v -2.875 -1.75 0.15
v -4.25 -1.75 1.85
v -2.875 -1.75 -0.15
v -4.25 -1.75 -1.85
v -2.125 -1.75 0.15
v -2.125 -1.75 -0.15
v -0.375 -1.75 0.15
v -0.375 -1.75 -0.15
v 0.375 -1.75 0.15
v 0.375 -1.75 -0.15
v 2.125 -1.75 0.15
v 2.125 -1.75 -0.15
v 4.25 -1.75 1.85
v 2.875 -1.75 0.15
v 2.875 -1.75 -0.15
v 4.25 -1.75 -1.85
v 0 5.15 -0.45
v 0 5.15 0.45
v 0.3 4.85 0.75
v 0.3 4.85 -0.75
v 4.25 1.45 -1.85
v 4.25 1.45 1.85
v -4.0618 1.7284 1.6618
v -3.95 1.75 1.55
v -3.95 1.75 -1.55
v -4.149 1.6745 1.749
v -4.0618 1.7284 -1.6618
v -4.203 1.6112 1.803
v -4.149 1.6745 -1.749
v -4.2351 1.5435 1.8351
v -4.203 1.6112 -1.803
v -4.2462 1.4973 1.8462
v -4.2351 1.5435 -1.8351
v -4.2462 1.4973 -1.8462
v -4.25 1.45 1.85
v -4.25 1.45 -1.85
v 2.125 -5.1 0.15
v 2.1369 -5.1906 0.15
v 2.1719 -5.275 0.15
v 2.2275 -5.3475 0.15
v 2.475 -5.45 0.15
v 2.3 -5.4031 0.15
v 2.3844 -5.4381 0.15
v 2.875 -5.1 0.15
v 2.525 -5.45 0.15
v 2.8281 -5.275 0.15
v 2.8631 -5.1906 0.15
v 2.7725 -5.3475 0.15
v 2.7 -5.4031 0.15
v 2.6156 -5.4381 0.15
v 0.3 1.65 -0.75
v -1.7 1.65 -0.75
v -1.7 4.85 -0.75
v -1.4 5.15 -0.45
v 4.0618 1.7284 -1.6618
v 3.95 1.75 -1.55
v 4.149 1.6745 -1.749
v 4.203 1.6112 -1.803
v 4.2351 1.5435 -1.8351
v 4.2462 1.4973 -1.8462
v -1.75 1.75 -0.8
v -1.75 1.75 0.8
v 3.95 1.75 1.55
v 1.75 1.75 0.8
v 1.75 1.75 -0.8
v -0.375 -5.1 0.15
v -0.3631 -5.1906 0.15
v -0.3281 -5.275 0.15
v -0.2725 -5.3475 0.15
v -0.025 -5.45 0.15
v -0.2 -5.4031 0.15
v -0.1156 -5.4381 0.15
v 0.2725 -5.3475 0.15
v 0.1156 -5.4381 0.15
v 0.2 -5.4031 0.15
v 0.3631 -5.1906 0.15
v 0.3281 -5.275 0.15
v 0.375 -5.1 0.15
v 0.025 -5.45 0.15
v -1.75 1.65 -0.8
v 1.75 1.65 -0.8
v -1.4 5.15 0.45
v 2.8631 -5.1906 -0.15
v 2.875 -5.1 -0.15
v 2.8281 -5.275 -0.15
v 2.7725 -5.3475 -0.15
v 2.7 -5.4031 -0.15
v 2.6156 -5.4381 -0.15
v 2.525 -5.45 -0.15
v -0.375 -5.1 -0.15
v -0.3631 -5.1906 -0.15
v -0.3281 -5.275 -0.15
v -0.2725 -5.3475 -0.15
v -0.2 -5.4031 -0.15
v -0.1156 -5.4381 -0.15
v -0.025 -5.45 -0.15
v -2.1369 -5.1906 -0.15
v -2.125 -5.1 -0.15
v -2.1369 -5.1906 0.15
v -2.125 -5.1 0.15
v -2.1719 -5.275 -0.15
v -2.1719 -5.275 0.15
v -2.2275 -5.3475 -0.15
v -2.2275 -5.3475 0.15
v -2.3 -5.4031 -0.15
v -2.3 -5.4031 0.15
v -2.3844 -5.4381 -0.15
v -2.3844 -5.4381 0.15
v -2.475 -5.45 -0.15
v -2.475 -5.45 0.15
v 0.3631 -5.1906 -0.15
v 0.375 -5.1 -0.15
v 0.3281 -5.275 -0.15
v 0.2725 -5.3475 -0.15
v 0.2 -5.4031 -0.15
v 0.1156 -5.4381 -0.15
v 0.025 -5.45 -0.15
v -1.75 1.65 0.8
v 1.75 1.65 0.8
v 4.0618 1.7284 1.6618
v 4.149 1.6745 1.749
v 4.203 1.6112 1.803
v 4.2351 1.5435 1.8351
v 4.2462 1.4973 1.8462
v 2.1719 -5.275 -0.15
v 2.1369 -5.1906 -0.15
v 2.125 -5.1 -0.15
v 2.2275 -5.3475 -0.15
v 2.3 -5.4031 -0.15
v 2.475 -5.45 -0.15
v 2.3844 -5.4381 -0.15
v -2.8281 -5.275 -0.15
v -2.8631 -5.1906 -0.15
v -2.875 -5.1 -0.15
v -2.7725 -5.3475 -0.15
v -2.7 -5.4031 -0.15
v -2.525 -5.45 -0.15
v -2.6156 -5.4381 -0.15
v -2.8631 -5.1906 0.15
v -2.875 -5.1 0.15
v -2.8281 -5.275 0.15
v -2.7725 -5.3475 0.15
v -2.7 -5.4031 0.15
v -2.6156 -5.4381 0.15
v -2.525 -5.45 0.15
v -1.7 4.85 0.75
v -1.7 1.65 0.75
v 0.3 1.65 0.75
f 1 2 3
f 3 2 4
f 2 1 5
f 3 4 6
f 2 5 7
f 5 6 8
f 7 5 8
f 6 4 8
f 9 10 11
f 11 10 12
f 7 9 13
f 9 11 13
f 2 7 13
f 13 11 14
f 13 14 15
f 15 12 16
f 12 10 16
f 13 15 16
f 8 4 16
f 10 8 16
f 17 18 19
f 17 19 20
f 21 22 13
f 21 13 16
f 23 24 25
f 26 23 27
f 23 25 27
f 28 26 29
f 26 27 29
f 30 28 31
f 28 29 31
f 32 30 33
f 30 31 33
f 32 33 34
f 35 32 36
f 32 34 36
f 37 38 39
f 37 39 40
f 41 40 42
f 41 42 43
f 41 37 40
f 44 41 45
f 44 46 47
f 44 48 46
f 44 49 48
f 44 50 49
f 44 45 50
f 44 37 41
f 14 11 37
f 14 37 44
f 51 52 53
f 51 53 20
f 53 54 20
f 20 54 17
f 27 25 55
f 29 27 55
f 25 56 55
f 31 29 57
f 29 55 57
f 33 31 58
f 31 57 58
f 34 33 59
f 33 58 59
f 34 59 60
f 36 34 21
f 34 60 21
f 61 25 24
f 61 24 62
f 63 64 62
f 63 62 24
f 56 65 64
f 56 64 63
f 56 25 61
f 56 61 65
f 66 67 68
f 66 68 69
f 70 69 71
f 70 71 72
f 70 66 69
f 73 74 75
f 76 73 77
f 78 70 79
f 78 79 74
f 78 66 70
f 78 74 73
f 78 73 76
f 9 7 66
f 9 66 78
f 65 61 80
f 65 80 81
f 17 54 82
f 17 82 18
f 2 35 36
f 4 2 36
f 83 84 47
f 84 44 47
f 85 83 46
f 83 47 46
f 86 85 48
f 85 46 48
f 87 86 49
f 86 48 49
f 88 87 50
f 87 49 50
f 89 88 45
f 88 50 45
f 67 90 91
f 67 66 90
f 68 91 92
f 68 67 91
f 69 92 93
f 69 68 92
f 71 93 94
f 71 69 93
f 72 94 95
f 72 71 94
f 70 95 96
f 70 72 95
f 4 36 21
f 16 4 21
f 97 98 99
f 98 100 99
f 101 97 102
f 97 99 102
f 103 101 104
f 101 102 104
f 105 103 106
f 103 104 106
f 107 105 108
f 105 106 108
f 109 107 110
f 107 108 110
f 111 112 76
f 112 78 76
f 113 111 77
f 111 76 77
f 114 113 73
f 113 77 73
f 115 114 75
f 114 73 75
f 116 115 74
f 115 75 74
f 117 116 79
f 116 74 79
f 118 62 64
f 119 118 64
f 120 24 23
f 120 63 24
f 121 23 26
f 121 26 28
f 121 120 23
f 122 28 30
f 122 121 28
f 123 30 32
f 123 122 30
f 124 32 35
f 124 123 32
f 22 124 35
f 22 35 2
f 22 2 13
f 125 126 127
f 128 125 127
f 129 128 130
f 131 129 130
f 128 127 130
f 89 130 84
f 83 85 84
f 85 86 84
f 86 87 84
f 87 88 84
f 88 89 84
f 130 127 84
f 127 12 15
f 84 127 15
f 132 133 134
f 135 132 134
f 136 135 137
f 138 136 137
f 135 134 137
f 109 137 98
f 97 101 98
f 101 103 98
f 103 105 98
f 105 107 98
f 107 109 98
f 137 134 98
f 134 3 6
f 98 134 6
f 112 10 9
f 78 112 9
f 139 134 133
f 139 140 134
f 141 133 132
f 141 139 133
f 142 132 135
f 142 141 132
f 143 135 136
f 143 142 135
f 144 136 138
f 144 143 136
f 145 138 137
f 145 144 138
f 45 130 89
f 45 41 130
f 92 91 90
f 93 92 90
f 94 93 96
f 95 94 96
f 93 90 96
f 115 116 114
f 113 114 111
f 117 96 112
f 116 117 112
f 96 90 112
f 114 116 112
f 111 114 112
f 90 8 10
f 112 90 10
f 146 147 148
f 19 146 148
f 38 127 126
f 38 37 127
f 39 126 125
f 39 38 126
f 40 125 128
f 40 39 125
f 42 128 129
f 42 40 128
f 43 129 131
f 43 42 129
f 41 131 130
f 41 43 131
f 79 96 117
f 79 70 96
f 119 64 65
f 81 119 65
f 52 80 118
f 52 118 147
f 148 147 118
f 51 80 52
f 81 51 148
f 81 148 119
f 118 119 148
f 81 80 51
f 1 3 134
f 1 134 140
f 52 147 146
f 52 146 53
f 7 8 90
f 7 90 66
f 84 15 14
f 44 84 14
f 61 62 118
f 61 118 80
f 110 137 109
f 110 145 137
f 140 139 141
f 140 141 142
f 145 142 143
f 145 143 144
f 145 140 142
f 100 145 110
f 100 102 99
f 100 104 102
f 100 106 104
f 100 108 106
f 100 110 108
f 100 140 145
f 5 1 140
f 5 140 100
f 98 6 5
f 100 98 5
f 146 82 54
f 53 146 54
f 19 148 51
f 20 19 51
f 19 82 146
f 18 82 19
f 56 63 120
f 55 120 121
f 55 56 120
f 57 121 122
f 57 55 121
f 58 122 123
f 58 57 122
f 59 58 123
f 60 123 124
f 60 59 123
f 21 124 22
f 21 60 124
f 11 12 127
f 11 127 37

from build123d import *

# Parameters (mm, degrees)
SKETCH1_W           = 8.5
SKETCH1_H           = 3.7
BOSS_EXTRUDE1_DEPTH = 1.75
SKETCH2_W           = 3.5
SKETCH2_H           = 1.6
CUT_EXTRUDE1_DEPTH  = 0.1
SKETCH3_W           = 2
SKETCH3_H           = 1.5
BOSS_EXTRUDE2_DEPTH = 3.5
SKETCH4_W           = 0.75
SKETCH4_H           = 0.3
BOSS_EXTRUDE3_DEPTH = 3.7
CHAMFER1_SIZE       = 0.3
FILLET1_R           = 0.3
FILLET2_R           = 0.35


with BuildPart() as part:
    # Sketch1 → Boss-Extrude1 (new, symmetric)
    with BuildSketch(Plane(origin=(0, 0, 0), x_dir=(1, 0, 0), z_dir=(0, 1, 0))):
        Rectangle(SKETCH1_W, SKETCH1_H)
    extrude(amount=BOSS_EXTRUDE1_DEPTH, both=True)

    # Sketch2 → Cut-Extrude1 (cut)
    with BuildSketch(Plane(origin=(0, 1.75, 0), x_dir=(1, 0, 0), z_dir=(0, 1, 0))):
        Rectangle(SKETCH2_W, SKETCH2_H)
    extrude(amount=-CUT_EXTRUDE1_DEPTH, mode=Mode.SUBTRACT)

    # Sketch3 → Boss-Extrude2 (add)
    with BuildSketch(Plane(origin=(0, 1.65, 0), x_dir=(1, 0, 0), z_dir=(0, 1, 0))):
        with Locations((-0.7, 0)):
            Rectangle(SKETCH3_W, SKETCH3_H)
    extrude(amount=BOSS_EXTRUDE2_DEPTH)

    # Sketch4 → Boss-Extrude3 (add)
    with BuildSketch(Plane.XZ.offset(1.75)):
        Rectangle(SKETCH4_W, SKETCH4_H)
        with Locations((-2.5, 0)):
            Rectangle(SKETCH4_W, SKETCH4_H)
        with Locations((2.5, 0)):
            Rectangle(SKETCH4_W, SKETCH4_H)
    extrude(amount=BOSS_EXTRUDE3_DEPTH)

    # Chamfer1
    chamfer1_edges = [part.edges().sort_by_distance(p)[0] for p in [
        (-1.7, 5.15, 0),
        (-0.7, 5.15, 0.75),
        (0.3, 5.15, 0),
        (-0.7, 5.15, -0.75),
    ]]
    chamfer(chamfer1_edges, length=CHAMFER1_SIZE)

    # Fillet1
    fillet1_edges = [part.edges().sort_by_distance(p)[0] for p in [
        (-4.25, 1.75, 0),
        (0, 1.75, 1.85),
        (4.25, 1.75, 0),
        (0, 1.75, -1.85),
    ]]
    fillet(fillet1_edges, radius=FILLET1_R)

    # Fillet2
    fillet2_edges = [part.edges().sort_by_distance(p)[0] for p in [
        (0.375, -5.45, 0),
        (-0.375, -5.45, 0),
        (-2.125, -5.45, 0),
        (-2.875, -5.45, 0),
        (2.125, -5.45, 0),
        (2.875, -5.45, 0),
    ]]
    fillet(fillet2_edges, radius=FILLET2_R)


solid = part.part
